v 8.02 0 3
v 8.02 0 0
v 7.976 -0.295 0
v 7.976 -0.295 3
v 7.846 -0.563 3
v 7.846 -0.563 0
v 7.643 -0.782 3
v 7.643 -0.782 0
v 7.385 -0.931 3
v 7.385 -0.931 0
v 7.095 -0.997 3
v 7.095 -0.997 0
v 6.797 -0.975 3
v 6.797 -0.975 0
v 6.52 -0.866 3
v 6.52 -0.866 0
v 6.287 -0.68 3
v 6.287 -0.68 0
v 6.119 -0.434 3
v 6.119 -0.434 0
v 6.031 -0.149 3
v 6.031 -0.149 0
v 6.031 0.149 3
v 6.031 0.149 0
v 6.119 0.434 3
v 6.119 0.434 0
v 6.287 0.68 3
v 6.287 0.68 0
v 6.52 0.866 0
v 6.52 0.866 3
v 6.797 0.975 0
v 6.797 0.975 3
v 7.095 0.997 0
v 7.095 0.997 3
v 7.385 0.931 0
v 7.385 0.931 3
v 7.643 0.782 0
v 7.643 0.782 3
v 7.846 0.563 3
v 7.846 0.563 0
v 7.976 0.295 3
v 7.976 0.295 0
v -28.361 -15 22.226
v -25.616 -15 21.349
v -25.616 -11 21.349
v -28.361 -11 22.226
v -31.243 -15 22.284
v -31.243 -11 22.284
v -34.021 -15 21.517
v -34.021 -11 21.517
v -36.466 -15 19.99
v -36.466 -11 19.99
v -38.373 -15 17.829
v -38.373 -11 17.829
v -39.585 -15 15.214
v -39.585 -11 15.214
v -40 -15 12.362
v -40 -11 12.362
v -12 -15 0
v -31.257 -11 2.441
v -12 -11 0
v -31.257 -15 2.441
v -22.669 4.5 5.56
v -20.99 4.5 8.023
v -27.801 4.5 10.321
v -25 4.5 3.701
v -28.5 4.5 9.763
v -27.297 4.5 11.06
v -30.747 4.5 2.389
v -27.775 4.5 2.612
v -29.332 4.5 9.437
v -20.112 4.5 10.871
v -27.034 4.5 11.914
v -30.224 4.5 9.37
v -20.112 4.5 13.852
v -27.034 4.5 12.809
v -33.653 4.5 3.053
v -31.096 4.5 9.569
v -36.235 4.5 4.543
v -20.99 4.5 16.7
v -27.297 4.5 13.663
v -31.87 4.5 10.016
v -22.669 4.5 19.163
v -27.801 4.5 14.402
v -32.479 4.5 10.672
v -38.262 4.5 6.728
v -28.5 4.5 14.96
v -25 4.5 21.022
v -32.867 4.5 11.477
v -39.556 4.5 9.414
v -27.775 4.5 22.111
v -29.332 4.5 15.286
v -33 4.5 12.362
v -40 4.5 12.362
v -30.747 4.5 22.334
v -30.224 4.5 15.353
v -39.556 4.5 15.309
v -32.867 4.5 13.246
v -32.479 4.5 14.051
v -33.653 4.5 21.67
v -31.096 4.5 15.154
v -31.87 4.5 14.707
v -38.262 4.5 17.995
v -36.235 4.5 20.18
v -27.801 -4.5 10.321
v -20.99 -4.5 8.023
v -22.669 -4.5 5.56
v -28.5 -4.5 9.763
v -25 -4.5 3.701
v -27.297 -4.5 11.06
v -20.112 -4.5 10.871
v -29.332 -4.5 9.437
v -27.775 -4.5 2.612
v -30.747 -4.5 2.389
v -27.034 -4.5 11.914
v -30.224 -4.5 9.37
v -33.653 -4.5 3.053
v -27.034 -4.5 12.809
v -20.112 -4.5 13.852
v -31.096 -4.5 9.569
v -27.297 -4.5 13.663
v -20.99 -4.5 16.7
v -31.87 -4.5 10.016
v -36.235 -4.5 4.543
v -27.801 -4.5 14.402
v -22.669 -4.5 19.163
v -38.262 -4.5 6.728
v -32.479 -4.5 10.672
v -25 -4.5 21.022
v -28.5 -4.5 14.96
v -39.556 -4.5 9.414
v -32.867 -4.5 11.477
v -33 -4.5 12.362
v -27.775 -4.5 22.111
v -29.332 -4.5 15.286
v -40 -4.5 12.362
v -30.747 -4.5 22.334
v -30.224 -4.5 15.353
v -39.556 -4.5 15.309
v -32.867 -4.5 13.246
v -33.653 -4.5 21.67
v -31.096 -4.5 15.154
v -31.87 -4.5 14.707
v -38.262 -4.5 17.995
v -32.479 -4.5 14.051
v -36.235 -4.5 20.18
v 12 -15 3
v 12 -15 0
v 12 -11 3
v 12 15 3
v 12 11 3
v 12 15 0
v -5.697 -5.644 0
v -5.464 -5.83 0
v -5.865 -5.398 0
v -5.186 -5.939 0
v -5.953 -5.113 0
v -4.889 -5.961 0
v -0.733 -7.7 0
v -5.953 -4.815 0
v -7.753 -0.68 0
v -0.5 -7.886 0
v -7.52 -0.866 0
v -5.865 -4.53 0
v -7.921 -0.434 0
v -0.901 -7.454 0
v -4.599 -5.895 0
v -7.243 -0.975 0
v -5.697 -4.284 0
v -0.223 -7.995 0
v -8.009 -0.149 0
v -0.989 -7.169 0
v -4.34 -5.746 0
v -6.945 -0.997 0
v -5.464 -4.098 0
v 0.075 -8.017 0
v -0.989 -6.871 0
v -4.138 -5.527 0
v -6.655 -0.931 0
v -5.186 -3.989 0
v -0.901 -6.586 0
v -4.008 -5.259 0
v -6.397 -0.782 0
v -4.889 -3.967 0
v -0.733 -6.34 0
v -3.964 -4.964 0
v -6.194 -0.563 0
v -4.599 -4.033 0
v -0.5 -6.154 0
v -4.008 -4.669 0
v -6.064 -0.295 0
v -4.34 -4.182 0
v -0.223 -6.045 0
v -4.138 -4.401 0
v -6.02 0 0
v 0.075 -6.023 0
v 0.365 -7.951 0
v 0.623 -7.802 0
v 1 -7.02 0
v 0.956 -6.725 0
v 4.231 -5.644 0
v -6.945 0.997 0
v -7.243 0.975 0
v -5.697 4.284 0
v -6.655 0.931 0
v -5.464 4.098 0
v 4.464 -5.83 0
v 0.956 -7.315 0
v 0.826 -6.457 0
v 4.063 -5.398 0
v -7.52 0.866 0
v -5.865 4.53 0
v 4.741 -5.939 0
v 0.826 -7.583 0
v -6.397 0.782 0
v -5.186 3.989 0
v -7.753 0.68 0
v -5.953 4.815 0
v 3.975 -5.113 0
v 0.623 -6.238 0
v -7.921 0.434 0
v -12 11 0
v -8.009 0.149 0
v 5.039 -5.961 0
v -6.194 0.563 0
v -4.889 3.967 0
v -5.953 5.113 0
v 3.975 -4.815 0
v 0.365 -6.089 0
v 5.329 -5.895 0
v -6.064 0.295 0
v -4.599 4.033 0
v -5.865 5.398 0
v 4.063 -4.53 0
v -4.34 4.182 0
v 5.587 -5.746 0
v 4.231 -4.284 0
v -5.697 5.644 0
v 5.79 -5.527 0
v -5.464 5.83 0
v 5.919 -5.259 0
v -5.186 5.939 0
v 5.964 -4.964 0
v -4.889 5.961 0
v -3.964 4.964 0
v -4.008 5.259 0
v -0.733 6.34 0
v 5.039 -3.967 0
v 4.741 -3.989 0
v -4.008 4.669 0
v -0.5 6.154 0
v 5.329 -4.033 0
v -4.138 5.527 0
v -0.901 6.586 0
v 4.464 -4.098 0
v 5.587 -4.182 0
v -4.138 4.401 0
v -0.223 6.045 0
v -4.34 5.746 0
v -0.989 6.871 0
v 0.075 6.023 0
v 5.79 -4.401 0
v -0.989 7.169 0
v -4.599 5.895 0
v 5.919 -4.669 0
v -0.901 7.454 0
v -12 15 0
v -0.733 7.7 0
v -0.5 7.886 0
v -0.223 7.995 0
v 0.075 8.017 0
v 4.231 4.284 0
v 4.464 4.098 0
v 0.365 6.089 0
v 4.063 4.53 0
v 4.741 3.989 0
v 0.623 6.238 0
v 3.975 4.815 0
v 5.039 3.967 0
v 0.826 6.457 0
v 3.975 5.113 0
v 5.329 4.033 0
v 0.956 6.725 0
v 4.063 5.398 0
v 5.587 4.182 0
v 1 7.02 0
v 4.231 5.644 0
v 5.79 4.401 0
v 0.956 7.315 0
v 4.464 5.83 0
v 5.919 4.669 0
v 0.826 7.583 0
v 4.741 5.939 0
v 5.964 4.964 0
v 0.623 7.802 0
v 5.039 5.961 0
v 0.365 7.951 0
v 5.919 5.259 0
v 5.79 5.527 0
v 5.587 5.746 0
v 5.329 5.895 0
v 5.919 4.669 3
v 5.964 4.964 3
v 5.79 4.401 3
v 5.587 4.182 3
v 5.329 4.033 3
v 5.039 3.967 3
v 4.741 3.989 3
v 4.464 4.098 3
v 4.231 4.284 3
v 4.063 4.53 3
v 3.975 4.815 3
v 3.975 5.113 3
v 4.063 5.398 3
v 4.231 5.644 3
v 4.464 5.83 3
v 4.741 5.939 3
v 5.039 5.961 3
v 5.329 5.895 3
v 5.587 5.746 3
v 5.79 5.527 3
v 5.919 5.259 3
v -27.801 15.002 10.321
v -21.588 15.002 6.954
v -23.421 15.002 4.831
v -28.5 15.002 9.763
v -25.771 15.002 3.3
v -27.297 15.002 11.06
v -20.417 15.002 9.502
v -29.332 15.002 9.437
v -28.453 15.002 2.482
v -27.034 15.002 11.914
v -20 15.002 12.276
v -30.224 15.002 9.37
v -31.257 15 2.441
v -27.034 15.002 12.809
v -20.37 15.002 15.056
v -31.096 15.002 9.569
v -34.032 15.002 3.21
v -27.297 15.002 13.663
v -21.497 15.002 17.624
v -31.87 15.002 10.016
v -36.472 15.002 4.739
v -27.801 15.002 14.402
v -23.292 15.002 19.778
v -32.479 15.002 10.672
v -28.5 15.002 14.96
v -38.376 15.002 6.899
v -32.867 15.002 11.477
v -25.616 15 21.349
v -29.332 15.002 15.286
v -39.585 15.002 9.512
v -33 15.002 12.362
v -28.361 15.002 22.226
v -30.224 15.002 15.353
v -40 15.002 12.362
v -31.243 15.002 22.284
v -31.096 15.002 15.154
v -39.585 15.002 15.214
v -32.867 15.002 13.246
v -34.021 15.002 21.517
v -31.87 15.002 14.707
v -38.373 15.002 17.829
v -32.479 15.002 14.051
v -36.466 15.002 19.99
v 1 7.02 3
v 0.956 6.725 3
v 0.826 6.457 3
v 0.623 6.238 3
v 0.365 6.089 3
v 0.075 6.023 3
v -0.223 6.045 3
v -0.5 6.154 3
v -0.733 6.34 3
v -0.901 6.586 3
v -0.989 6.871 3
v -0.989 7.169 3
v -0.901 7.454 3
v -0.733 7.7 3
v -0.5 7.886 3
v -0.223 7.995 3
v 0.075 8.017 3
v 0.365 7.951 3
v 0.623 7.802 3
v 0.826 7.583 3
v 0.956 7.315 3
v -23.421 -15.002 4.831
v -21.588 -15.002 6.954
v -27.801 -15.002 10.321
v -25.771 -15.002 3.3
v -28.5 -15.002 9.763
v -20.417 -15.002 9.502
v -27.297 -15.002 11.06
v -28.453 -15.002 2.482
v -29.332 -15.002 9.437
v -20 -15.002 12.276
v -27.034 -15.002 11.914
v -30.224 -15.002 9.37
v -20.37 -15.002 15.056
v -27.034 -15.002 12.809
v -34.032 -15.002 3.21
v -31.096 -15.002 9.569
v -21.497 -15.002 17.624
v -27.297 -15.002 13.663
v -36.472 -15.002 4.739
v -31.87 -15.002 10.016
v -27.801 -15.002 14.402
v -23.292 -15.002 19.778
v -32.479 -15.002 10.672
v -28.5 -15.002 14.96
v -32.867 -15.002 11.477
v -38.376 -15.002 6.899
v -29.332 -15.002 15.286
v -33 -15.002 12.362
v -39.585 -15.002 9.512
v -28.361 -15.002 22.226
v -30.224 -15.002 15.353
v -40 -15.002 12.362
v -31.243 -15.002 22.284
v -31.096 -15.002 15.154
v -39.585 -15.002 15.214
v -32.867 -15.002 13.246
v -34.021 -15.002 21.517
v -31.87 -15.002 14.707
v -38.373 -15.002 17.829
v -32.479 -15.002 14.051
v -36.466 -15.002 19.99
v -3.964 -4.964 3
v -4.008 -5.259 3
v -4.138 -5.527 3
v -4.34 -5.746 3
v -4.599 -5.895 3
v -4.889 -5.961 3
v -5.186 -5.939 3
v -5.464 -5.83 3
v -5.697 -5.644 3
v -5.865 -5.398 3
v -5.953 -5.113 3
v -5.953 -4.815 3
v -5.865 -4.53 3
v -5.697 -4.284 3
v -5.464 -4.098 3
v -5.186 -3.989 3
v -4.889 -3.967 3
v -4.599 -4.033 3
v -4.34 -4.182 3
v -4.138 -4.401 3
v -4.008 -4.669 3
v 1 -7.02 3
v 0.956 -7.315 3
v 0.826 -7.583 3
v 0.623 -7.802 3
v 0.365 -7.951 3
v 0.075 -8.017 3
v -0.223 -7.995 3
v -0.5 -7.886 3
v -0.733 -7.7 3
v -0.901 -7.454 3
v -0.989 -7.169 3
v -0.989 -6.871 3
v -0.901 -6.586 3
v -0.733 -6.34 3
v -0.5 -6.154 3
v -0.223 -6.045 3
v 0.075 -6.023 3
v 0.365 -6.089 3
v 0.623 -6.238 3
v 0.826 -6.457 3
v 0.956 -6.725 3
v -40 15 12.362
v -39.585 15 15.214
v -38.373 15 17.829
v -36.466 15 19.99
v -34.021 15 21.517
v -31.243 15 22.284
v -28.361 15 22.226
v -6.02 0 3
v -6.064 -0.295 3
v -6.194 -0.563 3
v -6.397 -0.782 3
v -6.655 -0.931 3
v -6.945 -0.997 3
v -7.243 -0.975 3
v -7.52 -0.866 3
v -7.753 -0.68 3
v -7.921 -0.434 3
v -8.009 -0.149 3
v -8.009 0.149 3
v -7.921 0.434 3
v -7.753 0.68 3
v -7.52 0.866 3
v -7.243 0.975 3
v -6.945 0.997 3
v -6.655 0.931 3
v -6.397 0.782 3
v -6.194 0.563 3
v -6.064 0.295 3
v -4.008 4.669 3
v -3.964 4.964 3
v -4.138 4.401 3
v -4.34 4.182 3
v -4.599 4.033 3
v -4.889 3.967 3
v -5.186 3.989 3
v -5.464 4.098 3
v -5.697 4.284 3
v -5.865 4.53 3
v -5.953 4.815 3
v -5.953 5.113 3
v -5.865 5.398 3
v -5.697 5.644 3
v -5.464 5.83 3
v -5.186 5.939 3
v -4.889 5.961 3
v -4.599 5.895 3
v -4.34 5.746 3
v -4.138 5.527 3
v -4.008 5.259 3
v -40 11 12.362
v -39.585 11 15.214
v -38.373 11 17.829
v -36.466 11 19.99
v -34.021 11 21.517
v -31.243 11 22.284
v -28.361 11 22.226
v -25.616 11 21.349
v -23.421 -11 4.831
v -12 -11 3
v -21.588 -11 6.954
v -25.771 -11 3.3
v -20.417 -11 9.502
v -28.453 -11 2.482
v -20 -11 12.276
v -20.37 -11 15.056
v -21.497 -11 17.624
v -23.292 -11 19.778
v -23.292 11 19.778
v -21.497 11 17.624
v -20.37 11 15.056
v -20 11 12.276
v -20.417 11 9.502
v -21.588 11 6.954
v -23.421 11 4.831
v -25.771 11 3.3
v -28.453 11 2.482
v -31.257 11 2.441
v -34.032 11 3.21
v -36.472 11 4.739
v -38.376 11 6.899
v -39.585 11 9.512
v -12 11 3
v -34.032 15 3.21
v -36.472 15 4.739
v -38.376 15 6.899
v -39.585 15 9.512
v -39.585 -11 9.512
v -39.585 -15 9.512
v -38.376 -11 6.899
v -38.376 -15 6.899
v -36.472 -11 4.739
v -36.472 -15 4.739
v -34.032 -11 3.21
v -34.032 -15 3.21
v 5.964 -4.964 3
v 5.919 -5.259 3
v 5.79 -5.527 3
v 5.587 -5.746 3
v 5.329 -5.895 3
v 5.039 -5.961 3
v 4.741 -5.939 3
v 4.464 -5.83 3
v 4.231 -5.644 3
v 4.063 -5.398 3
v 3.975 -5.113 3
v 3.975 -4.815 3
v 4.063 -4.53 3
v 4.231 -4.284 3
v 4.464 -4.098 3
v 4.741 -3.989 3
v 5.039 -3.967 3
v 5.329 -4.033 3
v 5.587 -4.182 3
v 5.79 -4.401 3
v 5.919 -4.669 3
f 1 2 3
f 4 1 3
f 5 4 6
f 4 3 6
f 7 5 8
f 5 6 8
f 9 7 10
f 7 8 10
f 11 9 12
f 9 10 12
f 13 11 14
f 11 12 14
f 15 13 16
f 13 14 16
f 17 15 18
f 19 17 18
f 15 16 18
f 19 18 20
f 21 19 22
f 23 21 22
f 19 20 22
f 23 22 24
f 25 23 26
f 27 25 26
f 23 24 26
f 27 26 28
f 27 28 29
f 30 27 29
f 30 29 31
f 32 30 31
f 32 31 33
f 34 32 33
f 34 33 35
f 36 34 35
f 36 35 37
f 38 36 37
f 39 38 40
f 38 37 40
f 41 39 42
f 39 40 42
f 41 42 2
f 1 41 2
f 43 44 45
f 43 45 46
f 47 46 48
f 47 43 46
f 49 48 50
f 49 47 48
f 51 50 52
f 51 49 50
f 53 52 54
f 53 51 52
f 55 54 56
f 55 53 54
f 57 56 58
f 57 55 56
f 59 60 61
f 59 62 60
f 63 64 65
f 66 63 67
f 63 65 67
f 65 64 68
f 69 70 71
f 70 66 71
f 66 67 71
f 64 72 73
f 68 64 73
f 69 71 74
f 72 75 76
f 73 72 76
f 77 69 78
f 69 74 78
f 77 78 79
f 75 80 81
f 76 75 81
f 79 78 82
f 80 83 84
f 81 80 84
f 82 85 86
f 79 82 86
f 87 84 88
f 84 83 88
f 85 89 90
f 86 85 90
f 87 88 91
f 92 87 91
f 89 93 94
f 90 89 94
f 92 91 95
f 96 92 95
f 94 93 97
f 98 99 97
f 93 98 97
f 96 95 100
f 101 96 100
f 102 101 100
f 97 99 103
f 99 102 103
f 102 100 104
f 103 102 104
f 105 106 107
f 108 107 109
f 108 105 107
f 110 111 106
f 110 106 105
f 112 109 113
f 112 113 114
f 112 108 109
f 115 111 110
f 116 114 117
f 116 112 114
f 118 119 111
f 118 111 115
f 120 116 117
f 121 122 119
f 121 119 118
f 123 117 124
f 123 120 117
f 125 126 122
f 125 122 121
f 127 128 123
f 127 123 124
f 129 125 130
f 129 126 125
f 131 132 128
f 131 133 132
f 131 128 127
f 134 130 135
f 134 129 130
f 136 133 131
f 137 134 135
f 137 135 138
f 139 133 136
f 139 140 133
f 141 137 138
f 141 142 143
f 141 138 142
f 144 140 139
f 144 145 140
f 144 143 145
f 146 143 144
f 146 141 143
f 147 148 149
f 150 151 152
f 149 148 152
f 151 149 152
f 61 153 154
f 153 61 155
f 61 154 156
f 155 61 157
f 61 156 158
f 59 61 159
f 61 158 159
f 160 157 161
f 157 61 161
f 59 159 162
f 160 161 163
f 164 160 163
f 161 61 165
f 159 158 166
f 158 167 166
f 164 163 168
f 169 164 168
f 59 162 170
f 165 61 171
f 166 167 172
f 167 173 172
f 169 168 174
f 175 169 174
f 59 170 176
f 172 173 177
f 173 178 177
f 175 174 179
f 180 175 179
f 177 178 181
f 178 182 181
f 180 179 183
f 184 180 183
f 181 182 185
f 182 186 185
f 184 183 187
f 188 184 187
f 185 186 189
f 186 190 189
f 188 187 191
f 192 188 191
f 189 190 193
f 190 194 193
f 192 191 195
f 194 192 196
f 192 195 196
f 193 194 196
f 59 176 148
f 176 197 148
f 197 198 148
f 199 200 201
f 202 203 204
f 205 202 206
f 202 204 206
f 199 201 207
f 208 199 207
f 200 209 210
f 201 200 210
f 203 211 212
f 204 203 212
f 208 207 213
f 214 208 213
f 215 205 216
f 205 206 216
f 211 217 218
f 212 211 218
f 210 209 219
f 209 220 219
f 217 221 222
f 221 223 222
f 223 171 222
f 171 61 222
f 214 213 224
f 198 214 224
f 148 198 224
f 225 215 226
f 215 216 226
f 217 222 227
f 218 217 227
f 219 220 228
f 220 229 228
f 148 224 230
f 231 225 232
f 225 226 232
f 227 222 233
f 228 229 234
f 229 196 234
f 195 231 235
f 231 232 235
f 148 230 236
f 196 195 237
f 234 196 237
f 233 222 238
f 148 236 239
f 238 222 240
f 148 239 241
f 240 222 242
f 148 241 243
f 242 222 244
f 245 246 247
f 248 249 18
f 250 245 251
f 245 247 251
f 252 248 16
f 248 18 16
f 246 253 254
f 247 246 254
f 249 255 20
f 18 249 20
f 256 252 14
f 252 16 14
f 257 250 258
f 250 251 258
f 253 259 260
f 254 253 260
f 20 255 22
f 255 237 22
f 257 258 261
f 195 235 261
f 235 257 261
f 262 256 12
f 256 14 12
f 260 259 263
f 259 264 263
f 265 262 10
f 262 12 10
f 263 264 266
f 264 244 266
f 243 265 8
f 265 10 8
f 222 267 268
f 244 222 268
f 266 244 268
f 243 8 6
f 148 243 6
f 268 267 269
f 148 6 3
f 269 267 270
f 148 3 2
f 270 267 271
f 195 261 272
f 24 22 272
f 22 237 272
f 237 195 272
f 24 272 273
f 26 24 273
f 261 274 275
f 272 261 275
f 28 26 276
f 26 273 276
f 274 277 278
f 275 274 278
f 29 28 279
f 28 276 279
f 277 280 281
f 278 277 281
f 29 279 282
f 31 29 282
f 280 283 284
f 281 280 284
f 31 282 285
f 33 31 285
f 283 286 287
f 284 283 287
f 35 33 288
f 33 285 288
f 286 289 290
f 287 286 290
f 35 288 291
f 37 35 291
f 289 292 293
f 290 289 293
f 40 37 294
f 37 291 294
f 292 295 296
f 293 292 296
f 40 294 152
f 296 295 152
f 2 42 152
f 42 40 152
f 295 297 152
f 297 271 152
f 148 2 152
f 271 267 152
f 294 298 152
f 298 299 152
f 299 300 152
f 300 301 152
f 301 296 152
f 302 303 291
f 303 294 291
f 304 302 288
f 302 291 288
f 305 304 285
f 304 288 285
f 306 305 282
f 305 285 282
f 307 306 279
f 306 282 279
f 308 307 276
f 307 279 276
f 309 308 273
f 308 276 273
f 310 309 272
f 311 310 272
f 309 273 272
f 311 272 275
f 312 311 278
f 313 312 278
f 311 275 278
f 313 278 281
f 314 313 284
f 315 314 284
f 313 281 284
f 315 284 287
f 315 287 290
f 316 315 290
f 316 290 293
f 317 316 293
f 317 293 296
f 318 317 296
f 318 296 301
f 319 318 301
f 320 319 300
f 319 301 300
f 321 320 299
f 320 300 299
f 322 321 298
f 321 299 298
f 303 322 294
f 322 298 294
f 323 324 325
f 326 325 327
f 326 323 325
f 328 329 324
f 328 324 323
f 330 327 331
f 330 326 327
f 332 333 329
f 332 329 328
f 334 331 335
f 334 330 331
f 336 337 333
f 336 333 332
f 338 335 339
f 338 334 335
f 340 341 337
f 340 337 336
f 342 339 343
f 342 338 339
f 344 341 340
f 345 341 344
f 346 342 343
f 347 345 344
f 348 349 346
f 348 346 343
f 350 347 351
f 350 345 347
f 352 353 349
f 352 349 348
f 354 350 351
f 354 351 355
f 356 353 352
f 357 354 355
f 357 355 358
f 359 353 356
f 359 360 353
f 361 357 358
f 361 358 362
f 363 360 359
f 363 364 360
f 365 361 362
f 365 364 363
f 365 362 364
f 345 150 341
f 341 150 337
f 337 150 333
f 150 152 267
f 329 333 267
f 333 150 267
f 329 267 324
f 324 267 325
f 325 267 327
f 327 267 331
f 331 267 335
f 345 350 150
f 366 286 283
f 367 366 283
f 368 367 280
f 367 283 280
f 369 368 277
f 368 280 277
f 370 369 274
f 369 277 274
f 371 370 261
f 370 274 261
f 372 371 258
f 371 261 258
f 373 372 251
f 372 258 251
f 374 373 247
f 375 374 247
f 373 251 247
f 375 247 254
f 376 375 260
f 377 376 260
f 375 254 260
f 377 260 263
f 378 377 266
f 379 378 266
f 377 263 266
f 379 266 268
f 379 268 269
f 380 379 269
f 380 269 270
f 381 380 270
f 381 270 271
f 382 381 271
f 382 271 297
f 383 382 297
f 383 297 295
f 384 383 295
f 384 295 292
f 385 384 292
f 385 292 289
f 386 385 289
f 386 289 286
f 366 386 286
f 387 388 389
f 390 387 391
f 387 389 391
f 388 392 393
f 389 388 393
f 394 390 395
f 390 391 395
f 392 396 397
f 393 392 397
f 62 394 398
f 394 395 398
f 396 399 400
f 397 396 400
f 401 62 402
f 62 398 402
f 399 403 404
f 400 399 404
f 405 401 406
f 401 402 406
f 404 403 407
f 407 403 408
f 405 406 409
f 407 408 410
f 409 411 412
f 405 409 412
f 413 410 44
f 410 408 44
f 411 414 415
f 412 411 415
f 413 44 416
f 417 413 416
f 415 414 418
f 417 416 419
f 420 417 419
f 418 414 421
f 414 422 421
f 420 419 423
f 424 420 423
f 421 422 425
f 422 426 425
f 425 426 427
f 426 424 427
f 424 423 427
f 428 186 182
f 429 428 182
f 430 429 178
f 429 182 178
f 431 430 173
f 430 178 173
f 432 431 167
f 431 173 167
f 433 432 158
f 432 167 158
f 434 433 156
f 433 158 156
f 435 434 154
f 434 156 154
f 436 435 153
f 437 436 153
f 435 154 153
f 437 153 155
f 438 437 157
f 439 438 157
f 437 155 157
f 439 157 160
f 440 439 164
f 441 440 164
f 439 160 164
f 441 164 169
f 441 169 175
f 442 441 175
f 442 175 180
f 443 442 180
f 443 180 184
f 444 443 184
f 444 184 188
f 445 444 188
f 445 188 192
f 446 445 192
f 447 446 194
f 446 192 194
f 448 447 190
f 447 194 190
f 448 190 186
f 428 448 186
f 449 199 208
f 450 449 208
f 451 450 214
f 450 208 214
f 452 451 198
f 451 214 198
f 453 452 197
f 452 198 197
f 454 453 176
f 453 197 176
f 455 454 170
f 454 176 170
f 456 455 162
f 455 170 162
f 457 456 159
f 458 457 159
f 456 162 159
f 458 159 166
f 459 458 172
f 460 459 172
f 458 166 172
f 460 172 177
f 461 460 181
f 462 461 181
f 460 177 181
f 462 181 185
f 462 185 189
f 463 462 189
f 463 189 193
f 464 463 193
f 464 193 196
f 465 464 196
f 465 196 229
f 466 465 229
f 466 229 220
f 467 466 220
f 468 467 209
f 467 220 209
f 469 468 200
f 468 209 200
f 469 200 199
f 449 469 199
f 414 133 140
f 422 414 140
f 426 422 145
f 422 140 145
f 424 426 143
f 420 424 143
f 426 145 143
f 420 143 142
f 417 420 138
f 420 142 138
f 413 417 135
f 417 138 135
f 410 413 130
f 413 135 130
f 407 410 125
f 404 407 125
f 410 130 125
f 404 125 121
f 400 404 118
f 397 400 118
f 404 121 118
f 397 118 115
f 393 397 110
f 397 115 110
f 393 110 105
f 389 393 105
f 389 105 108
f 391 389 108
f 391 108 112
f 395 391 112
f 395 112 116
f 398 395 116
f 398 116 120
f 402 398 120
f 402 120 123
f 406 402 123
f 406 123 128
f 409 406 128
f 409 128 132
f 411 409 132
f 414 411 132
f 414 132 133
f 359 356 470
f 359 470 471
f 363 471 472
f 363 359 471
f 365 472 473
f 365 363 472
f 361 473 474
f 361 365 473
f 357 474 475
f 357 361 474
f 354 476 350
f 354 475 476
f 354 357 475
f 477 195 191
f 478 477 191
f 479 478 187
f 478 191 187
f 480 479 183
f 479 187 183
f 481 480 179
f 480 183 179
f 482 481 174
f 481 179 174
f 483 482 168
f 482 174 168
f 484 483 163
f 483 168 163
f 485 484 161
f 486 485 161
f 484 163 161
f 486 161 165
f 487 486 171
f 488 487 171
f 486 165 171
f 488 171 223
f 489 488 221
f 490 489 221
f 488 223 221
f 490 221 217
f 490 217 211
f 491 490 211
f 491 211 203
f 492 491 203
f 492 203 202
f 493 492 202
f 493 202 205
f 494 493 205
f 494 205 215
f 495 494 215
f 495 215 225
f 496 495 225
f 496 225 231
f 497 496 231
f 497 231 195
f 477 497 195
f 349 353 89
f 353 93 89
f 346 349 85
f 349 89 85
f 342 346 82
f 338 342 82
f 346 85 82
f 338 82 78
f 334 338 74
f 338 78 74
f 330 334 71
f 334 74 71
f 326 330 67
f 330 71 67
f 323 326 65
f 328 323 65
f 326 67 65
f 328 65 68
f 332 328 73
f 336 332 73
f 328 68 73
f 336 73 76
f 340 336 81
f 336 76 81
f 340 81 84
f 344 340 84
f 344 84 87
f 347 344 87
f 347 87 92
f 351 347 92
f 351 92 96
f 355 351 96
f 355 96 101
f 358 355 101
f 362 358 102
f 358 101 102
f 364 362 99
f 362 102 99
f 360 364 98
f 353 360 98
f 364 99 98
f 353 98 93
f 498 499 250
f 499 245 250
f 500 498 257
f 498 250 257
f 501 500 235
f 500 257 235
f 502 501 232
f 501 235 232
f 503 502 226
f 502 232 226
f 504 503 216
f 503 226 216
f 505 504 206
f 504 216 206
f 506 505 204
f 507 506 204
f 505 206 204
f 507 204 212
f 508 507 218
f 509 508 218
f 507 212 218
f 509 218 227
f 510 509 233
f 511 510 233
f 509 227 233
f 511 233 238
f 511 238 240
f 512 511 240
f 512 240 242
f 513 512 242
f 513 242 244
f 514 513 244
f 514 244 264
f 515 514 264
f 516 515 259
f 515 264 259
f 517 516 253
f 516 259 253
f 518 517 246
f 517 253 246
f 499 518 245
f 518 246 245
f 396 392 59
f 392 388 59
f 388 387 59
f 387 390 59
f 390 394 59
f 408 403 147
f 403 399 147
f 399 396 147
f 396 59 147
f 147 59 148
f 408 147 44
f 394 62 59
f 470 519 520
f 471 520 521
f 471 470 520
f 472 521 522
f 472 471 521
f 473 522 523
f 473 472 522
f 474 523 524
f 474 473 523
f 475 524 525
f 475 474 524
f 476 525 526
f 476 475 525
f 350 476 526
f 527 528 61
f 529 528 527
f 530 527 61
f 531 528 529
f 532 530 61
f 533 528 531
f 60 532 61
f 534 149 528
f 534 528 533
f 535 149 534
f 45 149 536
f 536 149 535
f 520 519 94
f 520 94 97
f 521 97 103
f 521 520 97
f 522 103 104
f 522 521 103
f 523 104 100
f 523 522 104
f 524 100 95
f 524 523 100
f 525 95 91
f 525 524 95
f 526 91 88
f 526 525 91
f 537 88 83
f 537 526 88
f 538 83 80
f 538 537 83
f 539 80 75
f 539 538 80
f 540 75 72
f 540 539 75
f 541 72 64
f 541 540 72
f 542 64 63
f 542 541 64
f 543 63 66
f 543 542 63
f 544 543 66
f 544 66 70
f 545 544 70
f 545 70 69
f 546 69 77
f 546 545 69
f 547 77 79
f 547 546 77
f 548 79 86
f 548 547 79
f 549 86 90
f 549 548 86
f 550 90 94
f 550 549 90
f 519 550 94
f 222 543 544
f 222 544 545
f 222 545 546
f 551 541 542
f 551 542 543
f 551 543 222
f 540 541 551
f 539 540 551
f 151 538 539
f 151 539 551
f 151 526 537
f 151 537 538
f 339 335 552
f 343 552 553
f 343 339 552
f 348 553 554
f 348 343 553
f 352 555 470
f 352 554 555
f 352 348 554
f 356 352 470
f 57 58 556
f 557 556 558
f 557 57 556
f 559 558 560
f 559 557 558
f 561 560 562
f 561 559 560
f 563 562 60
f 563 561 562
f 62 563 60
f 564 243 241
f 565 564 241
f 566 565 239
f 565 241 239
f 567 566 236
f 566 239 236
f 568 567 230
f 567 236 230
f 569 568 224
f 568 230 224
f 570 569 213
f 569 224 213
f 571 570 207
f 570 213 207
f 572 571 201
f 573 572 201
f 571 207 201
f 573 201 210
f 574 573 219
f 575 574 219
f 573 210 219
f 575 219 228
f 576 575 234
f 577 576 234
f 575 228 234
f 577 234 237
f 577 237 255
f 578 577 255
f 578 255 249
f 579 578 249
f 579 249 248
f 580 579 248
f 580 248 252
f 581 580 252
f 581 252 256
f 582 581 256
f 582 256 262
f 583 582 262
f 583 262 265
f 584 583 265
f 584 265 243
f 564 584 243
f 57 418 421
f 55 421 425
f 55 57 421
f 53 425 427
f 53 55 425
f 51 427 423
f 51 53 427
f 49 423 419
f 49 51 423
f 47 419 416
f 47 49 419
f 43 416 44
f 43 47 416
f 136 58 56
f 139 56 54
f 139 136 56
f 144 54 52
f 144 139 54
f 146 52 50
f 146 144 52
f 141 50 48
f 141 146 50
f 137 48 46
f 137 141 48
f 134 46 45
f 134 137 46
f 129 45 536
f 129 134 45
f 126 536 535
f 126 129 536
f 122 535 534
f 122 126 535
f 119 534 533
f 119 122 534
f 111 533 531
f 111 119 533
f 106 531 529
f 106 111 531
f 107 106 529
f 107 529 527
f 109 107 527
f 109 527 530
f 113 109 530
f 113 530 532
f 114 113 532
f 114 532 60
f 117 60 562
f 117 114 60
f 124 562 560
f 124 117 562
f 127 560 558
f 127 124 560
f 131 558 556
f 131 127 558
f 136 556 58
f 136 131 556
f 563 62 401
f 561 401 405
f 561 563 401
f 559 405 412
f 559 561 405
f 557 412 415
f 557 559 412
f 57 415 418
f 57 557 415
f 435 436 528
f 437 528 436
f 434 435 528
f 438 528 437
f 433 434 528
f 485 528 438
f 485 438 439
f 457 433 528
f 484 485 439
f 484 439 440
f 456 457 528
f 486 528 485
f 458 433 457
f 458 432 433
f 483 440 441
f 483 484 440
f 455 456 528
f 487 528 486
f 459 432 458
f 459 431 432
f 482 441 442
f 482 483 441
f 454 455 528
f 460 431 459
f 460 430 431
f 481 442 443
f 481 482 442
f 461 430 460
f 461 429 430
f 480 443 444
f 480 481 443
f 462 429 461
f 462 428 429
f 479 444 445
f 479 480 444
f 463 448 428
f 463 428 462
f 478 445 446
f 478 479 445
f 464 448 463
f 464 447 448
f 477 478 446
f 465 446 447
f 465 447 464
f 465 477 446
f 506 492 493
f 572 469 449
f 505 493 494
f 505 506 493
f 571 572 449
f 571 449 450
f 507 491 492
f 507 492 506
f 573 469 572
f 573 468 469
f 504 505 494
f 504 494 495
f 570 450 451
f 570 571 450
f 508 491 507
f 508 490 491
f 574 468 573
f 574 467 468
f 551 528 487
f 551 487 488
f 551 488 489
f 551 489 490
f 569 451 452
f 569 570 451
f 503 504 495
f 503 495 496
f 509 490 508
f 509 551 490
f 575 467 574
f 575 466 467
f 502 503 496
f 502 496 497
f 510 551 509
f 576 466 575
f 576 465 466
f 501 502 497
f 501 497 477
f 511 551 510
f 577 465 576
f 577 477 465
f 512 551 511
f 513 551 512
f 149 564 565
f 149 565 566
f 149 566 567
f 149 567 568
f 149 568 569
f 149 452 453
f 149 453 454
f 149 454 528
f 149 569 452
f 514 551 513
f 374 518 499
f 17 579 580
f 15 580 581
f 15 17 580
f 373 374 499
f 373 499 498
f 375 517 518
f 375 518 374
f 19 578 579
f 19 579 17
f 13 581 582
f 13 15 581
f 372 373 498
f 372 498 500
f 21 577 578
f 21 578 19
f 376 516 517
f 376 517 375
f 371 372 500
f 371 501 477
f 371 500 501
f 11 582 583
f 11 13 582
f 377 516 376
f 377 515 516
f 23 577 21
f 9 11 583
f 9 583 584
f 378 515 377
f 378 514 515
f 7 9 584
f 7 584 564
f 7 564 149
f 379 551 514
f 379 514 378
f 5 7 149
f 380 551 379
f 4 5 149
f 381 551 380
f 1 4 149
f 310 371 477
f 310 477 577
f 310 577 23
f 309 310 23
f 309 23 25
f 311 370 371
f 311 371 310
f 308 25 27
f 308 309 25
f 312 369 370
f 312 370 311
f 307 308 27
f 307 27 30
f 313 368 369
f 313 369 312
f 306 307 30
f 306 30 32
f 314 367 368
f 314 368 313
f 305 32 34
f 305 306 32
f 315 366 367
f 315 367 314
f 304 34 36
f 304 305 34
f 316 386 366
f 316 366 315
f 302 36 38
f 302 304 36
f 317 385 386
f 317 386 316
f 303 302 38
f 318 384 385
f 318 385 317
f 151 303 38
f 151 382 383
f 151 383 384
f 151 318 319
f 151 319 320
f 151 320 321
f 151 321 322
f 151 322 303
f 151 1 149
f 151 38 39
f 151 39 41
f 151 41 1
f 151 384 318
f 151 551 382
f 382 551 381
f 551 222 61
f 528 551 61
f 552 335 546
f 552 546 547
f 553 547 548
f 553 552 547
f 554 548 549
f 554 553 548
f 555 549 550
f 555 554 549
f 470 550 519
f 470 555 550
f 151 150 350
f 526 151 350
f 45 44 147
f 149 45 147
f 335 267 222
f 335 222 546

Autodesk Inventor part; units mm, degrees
ref_plane "YZ Plane" through (0, 0, 0) normal (1, 0, 0) x (0, 1, 0)
ref_plane "XZ Plane" through (0, 0, 0) normal (0, 1, 0) x (-1, 0, 0)
ref_plane "XY Plane" through (0, 0, 0) normal (0, 0, 1) x (1, 0, 0)
sketch "Sketch2" plane through (0, 0, 0) normal (0, 0, 1) x (1, 0, 0)
  line L0 (-16.8, 0) -> (16.8, 0) construction
  line L1 (0, -21) -> (0, 21) construction
  line L2 (-12, -15) -> (12, -15)
  line L3 (12, -15) -> (12, 15)
  line L4 (12, 15) -> (-12, 15)
  line L5 (-12, 15) -> (-12, -15)
  circle A0 centre (7.02, 0) radius 1
  circle A1 centre (4.96389, 4.96389) radius 1
  circle A2 centre (0, 7.02) radius 1
  circle A3 centre (-4.96389, 4.96389) radius 1
  circle A4 centre (-7.02, 0) radius 1
  circle A5 centre (-4.96389, -4.96389) radius 1
  circle A6 centre (0, -7.02) radius 1
  circle A7 centre (4.96389, -4.96389) radius 1
  point P0 (0, 0)
  dimension "d3" = 30
  dimension "d4" = 24
  dimension "d5" = 7.02
  dimension "d6" = 2
  dimension "d9" = 360
extrude "Extrusion1" add sketch "Sketch2" along normal blind 3 contours L5 L4 L3 L2 | A0 | A1 | A2 | A3 | A4 | A5 | A6 | A7
sketch "Sketch1" plane through (0, 0, 0) normal (0, 1, 0) x (-1, 0, 0)
  line L0 (183.866798, 0) -> (-123.200788, 0) construction
  line L1 (-12, 0) -> (12, 0)
  line L2 (12, 0) -> (12, 3)
  line L3 (-12, 3) -> (12, 3)
  line L4 (-12, 0) -> (-12, 3)
  circle A0 centre (30, 12.361524) radius 10
  line L5 (-12, 0) -> (-12, 3)
  line L6 (25.615753, 21.349203) -> (-12, 3)
  line L7 (31.257448, 2.440898) -> (12, 0)
  circle A1 centre (30, 12.361524) radius 3
  dimension "d31" = 20
  dimension "d32" = 6
extrude "Extrusion6" add sketch "Sketch1" along normal blind 4 from surface at -15 contours L2 L3 L6 A0 L7 | A0 | A1
mirror "Mirror1" about plane through (0, 0, 0) normal (0, 1, 0) of "Extrusion6"
extrude "Extrusion7" cut sketch "Sketch2" along normal through all contours A0 | A1 | A2 | A3 | A4 | A5 | A6 | A7
extrude "Extrusion8" add sketch "Sketch1" along normal through all both and the other way through all contours A0 | A1
extrude "Extrusion9" cut sketch "Sketch1" along normal mid plane 9 contours A0 | A1
extrude "Extrusion10" cut sketch "Sketch1" along normal through all both and the other way through all contours A1
properties part number "bridge3"
